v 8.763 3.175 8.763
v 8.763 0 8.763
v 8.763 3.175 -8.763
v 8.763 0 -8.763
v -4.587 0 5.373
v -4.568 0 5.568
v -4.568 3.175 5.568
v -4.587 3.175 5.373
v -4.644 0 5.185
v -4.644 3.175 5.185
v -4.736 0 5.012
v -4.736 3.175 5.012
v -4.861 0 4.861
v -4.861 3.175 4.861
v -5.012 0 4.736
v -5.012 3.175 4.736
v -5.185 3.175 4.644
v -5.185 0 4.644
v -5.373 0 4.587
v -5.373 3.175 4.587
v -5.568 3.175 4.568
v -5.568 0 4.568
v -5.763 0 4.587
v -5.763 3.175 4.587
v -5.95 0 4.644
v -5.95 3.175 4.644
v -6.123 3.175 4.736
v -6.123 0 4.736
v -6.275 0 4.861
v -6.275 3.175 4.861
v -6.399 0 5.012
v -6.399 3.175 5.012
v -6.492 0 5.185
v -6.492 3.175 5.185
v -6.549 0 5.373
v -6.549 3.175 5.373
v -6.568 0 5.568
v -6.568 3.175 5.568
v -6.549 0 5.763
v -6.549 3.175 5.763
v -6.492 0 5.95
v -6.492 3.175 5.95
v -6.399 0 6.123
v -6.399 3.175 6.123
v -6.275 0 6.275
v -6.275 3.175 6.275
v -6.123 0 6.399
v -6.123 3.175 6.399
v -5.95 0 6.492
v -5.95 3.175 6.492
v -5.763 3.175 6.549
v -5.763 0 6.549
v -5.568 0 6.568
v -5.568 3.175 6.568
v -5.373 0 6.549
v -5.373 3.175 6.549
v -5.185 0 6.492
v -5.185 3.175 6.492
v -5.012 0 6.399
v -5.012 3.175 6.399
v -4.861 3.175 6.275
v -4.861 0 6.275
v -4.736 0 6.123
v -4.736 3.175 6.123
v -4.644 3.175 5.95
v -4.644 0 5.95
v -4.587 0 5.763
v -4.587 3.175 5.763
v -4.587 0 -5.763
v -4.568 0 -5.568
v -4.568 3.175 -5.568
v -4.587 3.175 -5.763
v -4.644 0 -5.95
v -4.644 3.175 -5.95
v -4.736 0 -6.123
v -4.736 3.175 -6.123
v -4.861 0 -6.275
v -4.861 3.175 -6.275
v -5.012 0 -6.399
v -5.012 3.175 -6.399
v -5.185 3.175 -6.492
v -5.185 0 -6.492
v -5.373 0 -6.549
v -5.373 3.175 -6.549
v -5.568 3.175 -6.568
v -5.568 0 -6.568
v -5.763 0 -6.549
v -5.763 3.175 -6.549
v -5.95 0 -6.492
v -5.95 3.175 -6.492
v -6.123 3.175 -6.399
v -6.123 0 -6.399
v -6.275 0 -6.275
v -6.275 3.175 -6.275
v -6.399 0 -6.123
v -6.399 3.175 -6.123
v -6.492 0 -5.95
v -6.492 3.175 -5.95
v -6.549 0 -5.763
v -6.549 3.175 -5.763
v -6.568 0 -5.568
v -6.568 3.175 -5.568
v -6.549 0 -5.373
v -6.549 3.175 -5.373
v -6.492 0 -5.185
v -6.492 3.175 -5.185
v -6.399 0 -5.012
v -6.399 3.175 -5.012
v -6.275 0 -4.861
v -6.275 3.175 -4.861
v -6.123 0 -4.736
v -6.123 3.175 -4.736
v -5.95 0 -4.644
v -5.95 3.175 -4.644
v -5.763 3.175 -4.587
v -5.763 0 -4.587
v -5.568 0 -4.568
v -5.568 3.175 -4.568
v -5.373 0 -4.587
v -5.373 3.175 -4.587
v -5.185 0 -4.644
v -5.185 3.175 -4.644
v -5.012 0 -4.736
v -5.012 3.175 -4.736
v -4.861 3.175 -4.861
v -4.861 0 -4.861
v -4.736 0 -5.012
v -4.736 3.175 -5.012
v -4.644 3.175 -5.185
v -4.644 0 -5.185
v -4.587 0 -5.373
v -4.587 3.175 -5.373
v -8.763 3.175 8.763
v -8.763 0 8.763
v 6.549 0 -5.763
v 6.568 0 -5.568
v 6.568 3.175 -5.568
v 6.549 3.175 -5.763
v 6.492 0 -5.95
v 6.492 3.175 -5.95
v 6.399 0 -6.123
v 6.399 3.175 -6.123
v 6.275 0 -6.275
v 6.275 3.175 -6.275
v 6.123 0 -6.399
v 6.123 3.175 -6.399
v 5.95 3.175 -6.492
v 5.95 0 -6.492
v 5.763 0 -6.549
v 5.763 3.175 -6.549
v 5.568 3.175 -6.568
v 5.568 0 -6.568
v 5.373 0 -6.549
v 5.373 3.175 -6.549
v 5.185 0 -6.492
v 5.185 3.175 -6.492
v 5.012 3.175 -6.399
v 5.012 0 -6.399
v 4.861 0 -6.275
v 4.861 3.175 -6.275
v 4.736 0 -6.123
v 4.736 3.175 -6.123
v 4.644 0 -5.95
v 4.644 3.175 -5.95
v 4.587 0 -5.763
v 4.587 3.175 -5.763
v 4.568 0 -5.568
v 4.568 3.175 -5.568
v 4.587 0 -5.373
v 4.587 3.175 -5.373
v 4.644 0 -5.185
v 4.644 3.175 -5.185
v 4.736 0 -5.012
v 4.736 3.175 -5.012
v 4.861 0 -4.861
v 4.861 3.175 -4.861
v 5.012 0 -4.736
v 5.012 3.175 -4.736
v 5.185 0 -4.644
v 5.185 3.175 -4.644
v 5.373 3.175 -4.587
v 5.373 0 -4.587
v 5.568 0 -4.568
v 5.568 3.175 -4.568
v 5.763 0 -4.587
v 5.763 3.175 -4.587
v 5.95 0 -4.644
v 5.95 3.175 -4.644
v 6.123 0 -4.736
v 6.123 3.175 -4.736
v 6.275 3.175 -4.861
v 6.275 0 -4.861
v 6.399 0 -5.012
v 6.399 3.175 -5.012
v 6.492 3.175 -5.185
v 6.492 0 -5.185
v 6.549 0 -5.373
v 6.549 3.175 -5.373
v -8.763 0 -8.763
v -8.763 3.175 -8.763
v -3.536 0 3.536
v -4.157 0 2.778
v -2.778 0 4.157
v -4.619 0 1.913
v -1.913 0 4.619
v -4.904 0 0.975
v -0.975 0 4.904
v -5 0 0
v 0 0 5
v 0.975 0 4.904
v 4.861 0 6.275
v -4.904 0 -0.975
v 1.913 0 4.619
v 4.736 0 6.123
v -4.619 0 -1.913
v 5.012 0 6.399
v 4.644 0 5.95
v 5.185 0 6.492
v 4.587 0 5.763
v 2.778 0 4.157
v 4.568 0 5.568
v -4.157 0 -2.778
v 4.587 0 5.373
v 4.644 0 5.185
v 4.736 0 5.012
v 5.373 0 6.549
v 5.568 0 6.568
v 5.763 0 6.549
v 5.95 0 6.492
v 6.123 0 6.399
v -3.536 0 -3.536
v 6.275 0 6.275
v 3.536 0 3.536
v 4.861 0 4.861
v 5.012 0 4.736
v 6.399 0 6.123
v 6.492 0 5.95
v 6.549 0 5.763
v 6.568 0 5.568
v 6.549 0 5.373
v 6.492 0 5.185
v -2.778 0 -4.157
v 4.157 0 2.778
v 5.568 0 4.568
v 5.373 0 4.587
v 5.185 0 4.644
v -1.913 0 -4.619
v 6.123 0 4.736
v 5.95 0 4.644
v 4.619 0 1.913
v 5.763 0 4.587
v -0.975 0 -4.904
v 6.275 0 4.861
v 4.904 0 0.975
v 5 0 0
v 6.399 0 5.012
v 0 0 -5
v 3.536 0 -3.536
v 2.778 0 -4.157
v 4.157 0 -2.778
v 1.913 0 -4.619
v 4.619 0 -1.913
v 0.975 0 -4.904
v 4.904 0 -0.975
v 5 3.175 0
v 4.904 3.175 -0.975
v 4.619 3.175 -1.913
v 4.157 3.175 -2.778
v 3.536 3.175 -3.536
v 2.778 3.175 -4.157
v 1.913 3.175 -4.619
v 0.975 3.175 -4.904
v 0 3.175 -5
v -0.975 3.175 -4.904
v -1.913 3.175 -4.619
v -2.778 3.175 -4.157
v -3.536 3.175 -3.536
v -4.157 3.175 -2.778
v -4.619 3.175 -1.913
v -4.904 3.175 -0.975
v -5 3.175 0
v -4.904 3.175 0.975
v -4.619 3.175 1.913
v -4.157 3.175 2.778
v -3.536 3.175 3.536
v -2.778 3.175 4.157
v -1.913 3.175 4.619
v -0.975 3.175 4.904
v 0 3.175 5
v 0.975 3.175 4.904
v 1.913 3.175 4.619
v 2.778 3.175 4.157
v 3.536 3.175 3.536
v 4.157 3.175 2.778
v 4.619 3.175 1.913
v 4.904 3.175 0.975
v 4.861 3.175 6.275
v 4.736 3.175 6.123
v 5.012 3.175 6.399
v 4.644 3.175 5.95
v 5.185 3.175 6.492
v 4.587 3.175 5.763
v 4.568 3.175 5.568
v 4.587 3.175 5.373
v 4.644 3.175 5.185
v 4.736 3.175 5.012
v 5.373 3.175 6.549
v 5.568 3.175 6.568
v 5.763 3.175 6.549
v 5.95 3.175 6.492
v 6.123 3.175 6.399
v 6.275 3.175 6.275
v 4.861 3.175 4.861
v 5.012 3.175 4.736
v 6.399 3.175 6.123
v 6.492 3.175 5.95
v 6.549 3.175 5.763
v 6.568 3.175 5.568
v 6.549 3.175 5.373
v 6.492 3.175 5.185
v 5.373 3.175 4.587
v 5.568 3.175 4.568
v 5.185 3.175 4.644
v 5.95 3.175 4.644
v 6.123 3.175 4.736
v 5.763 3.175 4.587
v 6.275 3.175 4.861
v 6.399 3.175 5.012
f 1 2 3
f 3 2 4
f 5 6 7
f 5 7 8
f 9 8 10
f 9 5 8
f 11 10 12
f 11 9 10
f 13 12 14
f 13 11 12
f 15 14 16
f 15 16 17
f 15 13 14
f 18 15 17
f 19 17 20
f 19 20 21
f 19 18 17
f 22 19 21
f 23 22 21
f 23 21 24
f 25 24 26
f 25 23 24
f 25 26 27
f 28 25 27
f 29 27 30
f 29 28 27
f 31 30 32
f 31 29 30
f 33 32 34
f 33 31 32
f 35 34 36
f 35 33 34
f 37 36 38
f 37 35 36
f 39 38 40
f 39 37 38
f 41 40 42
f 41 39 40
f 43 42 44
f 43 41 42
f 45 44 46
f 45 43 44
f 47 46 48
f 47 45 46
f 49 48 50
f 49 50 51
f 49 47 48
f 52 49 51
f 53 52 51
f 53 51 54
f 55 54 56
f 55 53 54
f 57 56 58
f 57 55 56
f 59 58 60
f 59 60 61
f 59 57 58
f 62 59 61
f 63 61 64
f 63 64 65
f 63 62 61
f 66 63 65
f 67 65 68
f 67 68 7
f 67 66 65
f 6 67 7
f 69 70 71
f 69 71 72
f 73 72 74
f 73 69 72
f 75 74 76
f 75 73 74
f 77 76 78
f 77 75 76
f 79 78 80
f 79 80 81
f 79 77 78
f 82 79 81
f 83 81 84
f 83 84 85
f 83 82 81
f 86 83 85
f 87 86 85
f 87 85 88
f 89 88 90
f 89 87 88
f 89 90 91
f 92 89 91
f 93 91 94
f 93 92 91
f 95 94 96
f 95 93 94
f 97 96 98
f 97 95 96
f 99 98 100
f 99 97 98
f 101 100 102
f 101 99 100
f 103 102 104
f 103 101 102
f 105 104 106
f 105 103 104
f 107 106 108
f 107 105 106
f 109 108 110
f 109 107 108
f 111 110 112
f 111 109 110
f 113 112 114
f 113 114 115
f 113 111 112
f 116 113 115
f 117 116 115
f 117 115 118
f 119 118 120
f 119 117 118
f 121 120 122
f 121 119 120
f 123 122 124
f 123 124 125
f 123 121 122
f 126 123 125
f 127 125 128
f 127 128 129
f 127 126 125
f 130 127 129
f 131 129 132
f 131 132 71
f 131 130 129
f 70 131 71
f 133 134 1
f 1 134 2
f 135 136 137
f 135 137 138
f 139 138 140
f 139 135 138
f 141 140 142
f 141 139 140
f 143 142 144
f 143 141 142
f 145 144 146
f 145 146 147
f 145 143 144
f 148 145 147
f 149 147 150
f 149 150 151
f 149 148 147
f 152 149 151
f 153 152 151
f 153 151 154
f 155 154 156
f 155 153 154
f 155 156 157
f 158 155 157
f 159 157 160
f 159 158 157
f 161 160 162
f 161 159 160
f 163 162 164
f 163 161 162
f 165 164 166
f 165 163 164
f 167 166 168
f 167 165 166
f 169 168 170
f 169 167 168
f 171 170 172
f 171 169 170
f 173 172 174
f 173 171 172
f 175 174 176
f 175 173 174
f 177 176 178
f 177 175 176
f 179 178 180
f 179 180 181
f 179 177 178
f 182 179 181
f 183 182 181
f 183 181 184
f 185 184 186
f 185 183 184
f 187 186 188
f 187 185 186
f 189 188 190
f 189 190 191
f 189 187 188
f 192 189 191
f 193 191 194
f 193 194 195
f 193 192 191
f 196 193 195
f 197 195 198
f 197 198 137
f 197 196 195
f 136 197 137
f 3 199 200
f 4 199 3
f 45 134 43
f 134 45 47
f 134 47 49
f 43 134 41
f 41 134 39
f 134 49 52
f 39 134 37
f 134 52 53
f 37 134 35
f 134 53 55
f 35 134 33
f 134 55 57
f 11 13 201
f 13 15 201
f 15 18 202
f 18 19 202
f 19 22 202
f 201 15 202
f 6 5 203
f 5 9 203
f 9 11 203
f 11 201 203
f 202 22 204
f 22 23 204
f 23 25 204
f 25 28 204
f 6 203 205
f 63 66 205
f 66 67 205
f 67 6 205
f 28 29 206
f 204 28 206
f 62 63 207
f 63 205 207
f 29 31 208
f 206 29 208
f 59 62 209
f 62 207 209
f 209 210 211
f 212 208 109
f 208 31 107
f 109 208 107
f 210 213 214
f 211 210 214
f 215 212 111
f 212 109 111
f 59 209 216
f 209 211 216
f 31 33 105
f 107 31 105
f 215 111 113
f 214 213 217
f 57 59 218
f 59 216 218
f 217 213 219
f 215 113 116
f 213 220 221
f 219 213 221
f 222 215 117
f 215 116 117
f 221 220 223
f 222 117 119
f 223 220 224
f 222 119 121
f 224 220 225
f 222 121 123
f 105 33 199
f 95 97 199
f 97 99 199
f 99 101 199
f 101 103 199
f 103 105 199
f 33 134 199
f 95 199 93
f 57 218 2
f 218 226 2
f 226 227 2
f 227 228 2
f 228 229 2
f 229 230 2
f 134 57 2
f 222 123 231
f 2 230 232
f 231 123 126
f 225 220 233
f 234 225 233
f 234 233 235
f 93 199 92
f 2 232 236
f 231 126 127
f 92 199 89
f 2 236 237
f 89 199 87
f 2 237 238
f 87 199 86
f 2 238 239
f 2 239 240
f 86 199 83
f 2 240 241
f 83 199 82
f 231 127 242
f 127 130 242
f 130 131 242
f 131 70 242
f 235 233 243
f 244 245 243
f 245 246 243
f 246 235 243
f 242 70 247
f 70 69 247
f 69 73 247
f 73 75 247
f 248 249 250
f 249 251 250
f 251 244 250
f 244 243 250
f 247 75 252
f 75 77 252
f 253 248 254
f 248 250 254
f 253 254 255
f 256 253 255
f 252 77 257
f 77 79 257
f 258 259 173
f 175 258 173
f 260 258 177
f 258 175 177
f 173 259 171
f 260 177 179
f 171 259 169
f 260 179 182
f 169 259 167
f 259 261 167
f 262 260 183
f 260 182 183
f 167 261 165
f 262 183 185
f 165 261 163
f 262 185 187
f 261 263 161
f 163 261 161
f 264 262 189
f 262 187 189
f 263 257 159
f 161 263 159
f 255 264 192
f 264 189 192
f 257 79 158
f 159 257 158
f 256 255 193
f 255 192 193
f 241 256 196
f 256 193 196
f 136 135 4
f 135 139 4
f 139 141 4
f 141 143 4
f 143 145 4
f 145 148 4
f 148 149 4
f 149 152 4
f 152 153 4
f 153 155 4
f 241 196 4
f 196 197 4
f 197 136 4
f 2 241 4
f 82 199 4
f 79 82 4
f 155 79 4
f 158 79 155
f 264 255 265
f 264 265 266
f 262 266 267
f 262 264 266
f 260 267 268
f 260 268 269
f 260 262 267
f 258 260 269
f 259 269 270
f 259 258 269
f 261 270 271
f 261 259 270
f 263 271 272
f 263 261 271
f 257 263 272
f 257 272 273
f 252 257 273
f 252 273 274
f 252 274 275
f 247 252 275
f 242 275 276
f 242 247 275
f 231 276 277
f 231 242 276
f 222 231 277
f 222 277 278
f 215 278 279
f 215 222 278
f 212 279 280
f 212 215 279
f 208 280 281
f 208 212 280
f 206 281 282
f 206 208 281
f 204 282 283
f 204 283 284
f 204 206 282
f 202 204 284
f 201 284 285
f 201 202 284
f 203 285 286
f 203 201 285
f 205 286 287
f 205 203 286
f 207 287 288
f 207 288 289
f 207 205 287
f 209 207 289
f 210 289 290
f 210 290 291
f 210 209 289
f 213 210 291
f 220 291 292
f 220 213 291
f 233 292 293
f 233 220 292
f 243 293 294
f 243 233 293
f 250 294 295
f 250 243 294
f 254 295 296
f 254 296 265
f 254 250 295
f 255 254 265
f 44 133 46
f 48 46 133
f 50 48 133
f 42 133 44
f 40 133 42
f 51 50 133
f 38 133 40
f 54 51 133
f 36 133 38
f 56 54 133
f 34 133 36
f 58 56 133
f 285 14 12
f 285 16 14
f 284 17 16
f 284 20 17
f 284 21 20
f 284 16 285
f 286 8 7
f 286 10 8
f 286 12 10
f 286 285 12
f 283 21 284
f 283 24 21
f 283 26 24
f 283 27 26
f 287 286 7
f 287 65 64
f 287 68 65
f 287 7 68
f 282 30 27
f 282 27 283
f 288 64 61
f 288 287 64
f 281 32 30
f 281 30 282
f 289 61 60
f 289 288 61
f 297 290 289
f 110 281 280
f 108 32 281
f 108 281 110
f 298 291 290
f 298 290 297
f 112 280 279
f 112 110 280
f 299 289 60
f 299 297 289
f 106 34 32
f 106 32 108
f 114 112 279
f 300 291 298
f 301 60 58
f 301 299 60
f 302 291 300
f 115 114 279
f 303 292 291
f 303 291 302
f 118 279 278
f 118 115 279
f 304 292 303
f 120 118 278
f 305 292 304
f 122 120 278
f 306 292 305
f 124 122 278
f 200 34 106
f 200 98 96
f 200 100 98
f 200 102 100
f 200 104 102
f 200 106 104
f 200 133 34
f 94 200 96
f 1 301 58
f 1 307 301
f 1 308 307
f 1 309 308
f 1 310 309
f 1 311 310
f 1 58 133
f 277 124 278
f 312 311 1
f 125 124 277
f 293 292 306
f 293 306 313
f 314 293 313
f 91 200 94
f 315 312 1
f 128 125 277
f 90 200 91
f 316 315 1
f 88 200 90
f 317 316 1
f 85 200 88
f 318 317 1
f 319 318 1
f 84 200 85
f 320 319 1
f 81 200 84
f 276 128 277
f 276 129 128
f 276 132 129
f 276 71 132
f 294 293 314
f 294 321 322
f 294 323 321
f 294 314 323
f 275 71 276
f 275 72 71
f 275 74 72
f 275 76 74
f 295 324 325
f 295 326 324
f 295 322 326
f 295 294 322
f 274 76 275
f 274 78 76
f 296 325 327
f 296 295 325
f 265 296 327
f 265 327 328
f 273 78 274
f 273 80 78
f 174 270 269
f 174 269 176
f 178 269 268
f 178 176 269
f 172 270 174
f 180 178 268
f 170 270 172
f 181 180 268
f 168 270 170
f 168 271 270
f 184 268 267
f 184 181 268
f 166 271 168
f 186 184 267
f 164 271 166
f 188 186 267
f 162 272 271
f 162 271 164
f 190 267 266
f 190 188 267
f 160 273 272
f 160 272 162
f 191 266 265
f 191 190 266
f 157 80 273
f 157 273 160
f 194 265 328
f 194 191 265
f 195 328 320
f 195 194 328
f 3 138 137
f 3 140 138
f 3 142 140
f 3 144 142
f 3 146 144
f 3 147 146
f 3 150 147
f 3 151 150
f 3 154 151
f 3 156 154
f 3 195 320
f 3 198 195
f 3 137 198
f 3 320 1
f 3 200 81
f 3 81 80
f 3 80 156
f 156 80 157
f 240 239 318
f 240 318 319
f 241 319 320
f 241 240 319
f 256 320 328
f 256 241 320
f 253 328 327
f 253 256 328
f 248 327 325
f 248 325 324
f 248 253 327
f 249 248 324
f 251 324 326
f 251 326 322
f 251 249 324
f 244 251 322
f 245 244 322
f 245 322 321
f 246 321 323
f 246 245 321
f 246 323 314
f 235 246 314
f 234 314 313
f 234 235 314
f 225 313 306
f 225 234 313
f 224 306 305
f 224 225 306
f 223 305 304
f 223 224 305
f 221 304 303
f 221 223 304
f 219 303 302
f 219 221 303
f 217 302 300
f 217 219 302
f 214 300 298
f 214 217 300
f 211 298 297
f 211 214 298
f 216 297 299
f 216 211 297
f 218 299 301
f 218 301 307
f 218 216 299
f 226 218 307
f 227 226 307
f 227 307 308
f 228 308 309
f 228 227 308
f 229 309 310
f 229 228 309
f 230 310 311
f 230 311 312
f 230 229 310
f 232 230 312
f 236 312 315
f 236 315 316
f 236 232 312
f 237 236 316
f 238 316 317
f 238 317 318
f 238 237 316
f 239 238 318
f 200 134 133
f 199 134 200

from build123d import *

# Parameters (mm, degrees)
SKETCH1_W           = 17.526
SKETCH1_H           = 17.526
SKETCH1_R           = 1
SKETCH1_R_2         = 5
BOSS_EXTRUDE1_DEPTH = 3.175


with BuildPart() as part:
    # Sketch1 → Boss-Extrude1 (new body)
    with BuildSketch(Plane(origin=(0, 0, 0), x_dir=(1, 0, 0), z_dir=(0, 1, 0))):
        Rectangle(SKETCH1_W, SKETCH1_H)
        with Locations((-5.567758795, 5.567758795)):
            Circle(SKETCH1_R, mode=Mode.SUBTRACT)
        with Locations((5.567758795, 5.567758795)):
            Circle(SKETCH1_R, mode=Mode.SUBTRACT)
        with Locations((5.567758795, -5.567758795)):
            Circle(SKETCH1_R, mode=Mode.SUBTRACT)
        with Locations((-5.567758795, -5.567758795)):
            Circle(SKETCH1_R, mode=Mode.SUBTRACT)
        Circle(SKETCH1_R_2, mode=Mode.SUBTRACT)
    extrude(amount=BOSS_EXTRUDE1_DEPTH)


solid = part.part
